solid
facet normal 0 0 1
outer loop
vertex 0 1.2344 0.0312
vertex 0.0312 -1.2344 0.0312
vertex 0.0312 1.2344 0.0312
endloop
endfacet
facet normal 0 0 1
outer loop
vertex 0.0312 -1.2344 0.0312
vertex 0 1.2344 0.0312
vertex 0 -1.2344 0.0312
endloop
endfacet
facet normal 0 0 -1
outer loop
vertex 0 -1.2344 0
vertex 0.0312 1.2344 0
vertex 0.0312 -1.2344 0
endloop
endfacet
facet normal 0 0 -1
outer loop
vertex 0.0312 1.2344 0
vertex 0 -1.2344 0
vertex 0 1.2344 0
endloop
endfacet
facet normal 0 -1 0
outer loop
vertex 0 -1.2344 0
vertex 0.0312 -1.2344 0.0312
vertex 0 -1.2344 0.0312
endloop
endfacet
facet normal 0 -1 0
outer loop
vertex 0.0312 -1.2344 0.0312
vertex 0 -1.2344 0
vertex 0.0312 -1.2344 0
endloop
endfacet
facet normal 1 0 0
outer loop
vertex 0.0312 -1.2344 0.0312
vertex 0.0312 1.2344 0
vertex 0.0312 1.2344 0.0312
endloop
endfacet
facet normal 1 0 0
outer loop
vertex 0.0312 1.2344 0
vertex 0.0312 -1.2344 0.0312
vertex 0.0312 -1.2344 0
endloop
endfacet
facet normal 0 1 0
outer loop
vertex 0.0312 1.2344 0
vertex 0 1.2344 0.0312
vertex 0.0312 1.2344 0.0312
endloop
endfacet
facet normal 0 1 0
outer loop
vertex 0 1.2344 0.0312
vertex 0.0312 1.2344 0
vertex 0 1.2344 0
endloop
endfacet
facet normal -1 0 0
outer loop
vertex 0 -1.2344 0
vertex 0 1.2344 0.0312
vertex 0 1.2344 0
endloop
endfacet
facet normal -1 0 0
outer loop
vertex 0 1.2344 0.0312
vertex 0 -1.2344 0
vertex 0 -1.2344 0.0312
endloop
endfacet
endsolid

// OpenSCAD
// file: colors.scad
// colors.scad
// Credit: David Powell, OpenSCAN Forum



//group ABS_<colorname>
//	discription  common 3d printer ABS filament colors
// actual colours may need some tweaking

ABS_Nature =[0.8,0.8,0.8,0.8];
ABS_White =[0.9,0.9,0.9,1];
ABS_Black =[0.1,0.1,0.1,1];
ABS_Red = [0.7,0,0,1];
ABS_Green = [0,0.7,0,1];
ABS_Blue = [0,0,0.7,1];
ABS_Orange =[0.8,0.4,0,1];
ABS_Purple =[0.7,0,0.7,1];
ABS_Brown =[0.6,0.2,0.2,1];
ABS_Glow_Blue =[0,0,.99,1];
ABS_Flurescence_Green =[0,1,0,1];
ABS_Flurescence_Yellow = [0.9,0.9,0,1];

//group PLA_<colorname>
//	discription  common 3d printer PLA filament colors
// actual colours may need some tweaking

PLA_Nature =[0.8,0.8,0.8,0.8];
PLA_White =[0.9,0.9,0.9,1];
PLA_Black =[0.1,0.1,0.1,1];
PLA_Red = [0.7,0,0,1];
PLA_Green = [0,0.7,0,1];
PLA_Blue = [0,0,0.7,1];
PLA_Orange =[0.8,0.4,0,1];
PLA_Purple =[0.7,0,0.7,1];
PLA_Brown =[0.6,0.2,0.2,1];
PLA_Glow_Blue =[0,0,.99,1];
PLA_Flurescence_Green =[0,1,0,1];
PLA_Flurescence_Yellow = [0.9,0.9,0,1];

//group ANODIZED_<colorname>
//	discription  common aluminium anodized colors
// these don't seem to follow normal color tables as the process
// produces a color change difference to the named color
// dew to base metal
// actual colours may need some tweaking

ANODIZED_Red =[0.7,0,0,1];
ANODIZED_Gold =[0.8,0.8,0.0,1];
ANODIZED_Black =[0.1,0.1,0.1,1];
ANODIZED_Blue =[0,0,0.7,1];
ANODIZED_Green =[0,0.5,0,1];
ANODIZED_Gray =[0.4,0.4,0.4,1];
ANODIZED_Dark_Blue =[0,0.2,0.6,1];
ANODIZED_Lime_Green =[0,0.8,0,1];
ANODIZED_Purple =[0.5,0,0.7,1];		//more blue than purple
ANODIZED_Light_Blue =[0.4,0.4,1,1];
ANODIZED_Pink =[0.7,0,0.7,1];		//more purlpe than pink
ANODIZED_Orange =[0.9,0.5,0,1];
ANODIZED_Scandia_Gold =[0.9,0.6,0.3,1];
ANODIZED_Copper =[0.7,0.5,0,1];		//more brown than copper
ANODIZED_Clear =[0.7,0.7,0.9,1];	//natural aluminium color
ANODIZED_Light_Bronze =[0.4,0.4,0.3,1]; //more silver than bronze
ANODIZED_Gold_Nickel =[0.8,0.8,0.6,1];
ANODIZED_Brush_Nickel =[0.8,0.8,0.7,1];

//group METAL_<typename>
//	discription common metal colors
// colors need tweaking

METAL_Aluminium = [0.7,0.7,0.8,1];
METAL_Brass = [0.88,0.78,0.5,1];
METAL_Copper = [0.9,0.6,0.5,1];
METAL_Steel = [0.9,0.9,0.8,1];
METAL_Stainless = [0.8,0.8,0.7,1];
METAL_Titanium = [0.7,0.7,0.6,1];
METAL_Bronze = [0.9,0.4,0.4,1];
METAL_Gold = [0.9,0.9,0.0,1];
METAL_Silver = [0.8,0.8,0.8,1];
METAL_Iron = [0.6,0.6,0.6,1];

// group WOOD_<typename>
//	discription common wood colors
// probabaly wrong

WOOD_Oak = [0.4,0.2,0.2,1];
WOOD_Birch = [0.8,0.8,0.4,1];
WOOD_Red = [0.7,0.3,0.3,1];
WOOD_pine = [0.8,0.8,0.4,1];
WOOD_Beach = [0.8,0.6,0.3,1];
WOOD_Spruce = [0.8,0.8,0.7,1];
WOOD_Balsa = [0.95,0.86,0.73];

// group GLASS_<color>
//	discription common glass colors
// needs tweaking

GLASS_Clear = [0.8,0.8,0.8,0.2];
GLASS_Red = [0.8,0,0,0.4];
GLASS_Green = [0,0.8,0,.4];
GLASS_Blue = [0,0,0.8,.4];
GLASS_Brown = [0.5,0.3,0.1,.4];
// file: MMlib/square_spar.scad
//####################################
// square_spar.scad
// (c) 2021 by Roie R. Black
//====================================


module square_spar(length=6,size=1/16) {
  translate([size/2, 0, size/2])
    cube([size,length,size], center=true);
}

square_spar(6,1/16);
// file: fin_data.scad
//#####################################
// fin-data.scad
// (c) 2021 by Roie R. Black
//=====================================
include <colors.scad>

fin_span = 2;
fin_chord = 4;
fin_radius = 1.5;
spar_size = 1/32;
fin_color = WOOD_Balsa;

//-------------------------------------
// calculated values

fin_le_length = fin_span - fin_radius - spar_size;
fin_te_length = fin_span -2*spar_size;
// main file
//########################################
// rib1.scad
// (c) 2021 - Roie R. Black
//****************************************
include <fin_data.scad>

use <MMlib/square_spar.scad>

module rib1() {
  square_spar(fin_chord-fin_radius-spar_size, spar_size);
}

rib1();
